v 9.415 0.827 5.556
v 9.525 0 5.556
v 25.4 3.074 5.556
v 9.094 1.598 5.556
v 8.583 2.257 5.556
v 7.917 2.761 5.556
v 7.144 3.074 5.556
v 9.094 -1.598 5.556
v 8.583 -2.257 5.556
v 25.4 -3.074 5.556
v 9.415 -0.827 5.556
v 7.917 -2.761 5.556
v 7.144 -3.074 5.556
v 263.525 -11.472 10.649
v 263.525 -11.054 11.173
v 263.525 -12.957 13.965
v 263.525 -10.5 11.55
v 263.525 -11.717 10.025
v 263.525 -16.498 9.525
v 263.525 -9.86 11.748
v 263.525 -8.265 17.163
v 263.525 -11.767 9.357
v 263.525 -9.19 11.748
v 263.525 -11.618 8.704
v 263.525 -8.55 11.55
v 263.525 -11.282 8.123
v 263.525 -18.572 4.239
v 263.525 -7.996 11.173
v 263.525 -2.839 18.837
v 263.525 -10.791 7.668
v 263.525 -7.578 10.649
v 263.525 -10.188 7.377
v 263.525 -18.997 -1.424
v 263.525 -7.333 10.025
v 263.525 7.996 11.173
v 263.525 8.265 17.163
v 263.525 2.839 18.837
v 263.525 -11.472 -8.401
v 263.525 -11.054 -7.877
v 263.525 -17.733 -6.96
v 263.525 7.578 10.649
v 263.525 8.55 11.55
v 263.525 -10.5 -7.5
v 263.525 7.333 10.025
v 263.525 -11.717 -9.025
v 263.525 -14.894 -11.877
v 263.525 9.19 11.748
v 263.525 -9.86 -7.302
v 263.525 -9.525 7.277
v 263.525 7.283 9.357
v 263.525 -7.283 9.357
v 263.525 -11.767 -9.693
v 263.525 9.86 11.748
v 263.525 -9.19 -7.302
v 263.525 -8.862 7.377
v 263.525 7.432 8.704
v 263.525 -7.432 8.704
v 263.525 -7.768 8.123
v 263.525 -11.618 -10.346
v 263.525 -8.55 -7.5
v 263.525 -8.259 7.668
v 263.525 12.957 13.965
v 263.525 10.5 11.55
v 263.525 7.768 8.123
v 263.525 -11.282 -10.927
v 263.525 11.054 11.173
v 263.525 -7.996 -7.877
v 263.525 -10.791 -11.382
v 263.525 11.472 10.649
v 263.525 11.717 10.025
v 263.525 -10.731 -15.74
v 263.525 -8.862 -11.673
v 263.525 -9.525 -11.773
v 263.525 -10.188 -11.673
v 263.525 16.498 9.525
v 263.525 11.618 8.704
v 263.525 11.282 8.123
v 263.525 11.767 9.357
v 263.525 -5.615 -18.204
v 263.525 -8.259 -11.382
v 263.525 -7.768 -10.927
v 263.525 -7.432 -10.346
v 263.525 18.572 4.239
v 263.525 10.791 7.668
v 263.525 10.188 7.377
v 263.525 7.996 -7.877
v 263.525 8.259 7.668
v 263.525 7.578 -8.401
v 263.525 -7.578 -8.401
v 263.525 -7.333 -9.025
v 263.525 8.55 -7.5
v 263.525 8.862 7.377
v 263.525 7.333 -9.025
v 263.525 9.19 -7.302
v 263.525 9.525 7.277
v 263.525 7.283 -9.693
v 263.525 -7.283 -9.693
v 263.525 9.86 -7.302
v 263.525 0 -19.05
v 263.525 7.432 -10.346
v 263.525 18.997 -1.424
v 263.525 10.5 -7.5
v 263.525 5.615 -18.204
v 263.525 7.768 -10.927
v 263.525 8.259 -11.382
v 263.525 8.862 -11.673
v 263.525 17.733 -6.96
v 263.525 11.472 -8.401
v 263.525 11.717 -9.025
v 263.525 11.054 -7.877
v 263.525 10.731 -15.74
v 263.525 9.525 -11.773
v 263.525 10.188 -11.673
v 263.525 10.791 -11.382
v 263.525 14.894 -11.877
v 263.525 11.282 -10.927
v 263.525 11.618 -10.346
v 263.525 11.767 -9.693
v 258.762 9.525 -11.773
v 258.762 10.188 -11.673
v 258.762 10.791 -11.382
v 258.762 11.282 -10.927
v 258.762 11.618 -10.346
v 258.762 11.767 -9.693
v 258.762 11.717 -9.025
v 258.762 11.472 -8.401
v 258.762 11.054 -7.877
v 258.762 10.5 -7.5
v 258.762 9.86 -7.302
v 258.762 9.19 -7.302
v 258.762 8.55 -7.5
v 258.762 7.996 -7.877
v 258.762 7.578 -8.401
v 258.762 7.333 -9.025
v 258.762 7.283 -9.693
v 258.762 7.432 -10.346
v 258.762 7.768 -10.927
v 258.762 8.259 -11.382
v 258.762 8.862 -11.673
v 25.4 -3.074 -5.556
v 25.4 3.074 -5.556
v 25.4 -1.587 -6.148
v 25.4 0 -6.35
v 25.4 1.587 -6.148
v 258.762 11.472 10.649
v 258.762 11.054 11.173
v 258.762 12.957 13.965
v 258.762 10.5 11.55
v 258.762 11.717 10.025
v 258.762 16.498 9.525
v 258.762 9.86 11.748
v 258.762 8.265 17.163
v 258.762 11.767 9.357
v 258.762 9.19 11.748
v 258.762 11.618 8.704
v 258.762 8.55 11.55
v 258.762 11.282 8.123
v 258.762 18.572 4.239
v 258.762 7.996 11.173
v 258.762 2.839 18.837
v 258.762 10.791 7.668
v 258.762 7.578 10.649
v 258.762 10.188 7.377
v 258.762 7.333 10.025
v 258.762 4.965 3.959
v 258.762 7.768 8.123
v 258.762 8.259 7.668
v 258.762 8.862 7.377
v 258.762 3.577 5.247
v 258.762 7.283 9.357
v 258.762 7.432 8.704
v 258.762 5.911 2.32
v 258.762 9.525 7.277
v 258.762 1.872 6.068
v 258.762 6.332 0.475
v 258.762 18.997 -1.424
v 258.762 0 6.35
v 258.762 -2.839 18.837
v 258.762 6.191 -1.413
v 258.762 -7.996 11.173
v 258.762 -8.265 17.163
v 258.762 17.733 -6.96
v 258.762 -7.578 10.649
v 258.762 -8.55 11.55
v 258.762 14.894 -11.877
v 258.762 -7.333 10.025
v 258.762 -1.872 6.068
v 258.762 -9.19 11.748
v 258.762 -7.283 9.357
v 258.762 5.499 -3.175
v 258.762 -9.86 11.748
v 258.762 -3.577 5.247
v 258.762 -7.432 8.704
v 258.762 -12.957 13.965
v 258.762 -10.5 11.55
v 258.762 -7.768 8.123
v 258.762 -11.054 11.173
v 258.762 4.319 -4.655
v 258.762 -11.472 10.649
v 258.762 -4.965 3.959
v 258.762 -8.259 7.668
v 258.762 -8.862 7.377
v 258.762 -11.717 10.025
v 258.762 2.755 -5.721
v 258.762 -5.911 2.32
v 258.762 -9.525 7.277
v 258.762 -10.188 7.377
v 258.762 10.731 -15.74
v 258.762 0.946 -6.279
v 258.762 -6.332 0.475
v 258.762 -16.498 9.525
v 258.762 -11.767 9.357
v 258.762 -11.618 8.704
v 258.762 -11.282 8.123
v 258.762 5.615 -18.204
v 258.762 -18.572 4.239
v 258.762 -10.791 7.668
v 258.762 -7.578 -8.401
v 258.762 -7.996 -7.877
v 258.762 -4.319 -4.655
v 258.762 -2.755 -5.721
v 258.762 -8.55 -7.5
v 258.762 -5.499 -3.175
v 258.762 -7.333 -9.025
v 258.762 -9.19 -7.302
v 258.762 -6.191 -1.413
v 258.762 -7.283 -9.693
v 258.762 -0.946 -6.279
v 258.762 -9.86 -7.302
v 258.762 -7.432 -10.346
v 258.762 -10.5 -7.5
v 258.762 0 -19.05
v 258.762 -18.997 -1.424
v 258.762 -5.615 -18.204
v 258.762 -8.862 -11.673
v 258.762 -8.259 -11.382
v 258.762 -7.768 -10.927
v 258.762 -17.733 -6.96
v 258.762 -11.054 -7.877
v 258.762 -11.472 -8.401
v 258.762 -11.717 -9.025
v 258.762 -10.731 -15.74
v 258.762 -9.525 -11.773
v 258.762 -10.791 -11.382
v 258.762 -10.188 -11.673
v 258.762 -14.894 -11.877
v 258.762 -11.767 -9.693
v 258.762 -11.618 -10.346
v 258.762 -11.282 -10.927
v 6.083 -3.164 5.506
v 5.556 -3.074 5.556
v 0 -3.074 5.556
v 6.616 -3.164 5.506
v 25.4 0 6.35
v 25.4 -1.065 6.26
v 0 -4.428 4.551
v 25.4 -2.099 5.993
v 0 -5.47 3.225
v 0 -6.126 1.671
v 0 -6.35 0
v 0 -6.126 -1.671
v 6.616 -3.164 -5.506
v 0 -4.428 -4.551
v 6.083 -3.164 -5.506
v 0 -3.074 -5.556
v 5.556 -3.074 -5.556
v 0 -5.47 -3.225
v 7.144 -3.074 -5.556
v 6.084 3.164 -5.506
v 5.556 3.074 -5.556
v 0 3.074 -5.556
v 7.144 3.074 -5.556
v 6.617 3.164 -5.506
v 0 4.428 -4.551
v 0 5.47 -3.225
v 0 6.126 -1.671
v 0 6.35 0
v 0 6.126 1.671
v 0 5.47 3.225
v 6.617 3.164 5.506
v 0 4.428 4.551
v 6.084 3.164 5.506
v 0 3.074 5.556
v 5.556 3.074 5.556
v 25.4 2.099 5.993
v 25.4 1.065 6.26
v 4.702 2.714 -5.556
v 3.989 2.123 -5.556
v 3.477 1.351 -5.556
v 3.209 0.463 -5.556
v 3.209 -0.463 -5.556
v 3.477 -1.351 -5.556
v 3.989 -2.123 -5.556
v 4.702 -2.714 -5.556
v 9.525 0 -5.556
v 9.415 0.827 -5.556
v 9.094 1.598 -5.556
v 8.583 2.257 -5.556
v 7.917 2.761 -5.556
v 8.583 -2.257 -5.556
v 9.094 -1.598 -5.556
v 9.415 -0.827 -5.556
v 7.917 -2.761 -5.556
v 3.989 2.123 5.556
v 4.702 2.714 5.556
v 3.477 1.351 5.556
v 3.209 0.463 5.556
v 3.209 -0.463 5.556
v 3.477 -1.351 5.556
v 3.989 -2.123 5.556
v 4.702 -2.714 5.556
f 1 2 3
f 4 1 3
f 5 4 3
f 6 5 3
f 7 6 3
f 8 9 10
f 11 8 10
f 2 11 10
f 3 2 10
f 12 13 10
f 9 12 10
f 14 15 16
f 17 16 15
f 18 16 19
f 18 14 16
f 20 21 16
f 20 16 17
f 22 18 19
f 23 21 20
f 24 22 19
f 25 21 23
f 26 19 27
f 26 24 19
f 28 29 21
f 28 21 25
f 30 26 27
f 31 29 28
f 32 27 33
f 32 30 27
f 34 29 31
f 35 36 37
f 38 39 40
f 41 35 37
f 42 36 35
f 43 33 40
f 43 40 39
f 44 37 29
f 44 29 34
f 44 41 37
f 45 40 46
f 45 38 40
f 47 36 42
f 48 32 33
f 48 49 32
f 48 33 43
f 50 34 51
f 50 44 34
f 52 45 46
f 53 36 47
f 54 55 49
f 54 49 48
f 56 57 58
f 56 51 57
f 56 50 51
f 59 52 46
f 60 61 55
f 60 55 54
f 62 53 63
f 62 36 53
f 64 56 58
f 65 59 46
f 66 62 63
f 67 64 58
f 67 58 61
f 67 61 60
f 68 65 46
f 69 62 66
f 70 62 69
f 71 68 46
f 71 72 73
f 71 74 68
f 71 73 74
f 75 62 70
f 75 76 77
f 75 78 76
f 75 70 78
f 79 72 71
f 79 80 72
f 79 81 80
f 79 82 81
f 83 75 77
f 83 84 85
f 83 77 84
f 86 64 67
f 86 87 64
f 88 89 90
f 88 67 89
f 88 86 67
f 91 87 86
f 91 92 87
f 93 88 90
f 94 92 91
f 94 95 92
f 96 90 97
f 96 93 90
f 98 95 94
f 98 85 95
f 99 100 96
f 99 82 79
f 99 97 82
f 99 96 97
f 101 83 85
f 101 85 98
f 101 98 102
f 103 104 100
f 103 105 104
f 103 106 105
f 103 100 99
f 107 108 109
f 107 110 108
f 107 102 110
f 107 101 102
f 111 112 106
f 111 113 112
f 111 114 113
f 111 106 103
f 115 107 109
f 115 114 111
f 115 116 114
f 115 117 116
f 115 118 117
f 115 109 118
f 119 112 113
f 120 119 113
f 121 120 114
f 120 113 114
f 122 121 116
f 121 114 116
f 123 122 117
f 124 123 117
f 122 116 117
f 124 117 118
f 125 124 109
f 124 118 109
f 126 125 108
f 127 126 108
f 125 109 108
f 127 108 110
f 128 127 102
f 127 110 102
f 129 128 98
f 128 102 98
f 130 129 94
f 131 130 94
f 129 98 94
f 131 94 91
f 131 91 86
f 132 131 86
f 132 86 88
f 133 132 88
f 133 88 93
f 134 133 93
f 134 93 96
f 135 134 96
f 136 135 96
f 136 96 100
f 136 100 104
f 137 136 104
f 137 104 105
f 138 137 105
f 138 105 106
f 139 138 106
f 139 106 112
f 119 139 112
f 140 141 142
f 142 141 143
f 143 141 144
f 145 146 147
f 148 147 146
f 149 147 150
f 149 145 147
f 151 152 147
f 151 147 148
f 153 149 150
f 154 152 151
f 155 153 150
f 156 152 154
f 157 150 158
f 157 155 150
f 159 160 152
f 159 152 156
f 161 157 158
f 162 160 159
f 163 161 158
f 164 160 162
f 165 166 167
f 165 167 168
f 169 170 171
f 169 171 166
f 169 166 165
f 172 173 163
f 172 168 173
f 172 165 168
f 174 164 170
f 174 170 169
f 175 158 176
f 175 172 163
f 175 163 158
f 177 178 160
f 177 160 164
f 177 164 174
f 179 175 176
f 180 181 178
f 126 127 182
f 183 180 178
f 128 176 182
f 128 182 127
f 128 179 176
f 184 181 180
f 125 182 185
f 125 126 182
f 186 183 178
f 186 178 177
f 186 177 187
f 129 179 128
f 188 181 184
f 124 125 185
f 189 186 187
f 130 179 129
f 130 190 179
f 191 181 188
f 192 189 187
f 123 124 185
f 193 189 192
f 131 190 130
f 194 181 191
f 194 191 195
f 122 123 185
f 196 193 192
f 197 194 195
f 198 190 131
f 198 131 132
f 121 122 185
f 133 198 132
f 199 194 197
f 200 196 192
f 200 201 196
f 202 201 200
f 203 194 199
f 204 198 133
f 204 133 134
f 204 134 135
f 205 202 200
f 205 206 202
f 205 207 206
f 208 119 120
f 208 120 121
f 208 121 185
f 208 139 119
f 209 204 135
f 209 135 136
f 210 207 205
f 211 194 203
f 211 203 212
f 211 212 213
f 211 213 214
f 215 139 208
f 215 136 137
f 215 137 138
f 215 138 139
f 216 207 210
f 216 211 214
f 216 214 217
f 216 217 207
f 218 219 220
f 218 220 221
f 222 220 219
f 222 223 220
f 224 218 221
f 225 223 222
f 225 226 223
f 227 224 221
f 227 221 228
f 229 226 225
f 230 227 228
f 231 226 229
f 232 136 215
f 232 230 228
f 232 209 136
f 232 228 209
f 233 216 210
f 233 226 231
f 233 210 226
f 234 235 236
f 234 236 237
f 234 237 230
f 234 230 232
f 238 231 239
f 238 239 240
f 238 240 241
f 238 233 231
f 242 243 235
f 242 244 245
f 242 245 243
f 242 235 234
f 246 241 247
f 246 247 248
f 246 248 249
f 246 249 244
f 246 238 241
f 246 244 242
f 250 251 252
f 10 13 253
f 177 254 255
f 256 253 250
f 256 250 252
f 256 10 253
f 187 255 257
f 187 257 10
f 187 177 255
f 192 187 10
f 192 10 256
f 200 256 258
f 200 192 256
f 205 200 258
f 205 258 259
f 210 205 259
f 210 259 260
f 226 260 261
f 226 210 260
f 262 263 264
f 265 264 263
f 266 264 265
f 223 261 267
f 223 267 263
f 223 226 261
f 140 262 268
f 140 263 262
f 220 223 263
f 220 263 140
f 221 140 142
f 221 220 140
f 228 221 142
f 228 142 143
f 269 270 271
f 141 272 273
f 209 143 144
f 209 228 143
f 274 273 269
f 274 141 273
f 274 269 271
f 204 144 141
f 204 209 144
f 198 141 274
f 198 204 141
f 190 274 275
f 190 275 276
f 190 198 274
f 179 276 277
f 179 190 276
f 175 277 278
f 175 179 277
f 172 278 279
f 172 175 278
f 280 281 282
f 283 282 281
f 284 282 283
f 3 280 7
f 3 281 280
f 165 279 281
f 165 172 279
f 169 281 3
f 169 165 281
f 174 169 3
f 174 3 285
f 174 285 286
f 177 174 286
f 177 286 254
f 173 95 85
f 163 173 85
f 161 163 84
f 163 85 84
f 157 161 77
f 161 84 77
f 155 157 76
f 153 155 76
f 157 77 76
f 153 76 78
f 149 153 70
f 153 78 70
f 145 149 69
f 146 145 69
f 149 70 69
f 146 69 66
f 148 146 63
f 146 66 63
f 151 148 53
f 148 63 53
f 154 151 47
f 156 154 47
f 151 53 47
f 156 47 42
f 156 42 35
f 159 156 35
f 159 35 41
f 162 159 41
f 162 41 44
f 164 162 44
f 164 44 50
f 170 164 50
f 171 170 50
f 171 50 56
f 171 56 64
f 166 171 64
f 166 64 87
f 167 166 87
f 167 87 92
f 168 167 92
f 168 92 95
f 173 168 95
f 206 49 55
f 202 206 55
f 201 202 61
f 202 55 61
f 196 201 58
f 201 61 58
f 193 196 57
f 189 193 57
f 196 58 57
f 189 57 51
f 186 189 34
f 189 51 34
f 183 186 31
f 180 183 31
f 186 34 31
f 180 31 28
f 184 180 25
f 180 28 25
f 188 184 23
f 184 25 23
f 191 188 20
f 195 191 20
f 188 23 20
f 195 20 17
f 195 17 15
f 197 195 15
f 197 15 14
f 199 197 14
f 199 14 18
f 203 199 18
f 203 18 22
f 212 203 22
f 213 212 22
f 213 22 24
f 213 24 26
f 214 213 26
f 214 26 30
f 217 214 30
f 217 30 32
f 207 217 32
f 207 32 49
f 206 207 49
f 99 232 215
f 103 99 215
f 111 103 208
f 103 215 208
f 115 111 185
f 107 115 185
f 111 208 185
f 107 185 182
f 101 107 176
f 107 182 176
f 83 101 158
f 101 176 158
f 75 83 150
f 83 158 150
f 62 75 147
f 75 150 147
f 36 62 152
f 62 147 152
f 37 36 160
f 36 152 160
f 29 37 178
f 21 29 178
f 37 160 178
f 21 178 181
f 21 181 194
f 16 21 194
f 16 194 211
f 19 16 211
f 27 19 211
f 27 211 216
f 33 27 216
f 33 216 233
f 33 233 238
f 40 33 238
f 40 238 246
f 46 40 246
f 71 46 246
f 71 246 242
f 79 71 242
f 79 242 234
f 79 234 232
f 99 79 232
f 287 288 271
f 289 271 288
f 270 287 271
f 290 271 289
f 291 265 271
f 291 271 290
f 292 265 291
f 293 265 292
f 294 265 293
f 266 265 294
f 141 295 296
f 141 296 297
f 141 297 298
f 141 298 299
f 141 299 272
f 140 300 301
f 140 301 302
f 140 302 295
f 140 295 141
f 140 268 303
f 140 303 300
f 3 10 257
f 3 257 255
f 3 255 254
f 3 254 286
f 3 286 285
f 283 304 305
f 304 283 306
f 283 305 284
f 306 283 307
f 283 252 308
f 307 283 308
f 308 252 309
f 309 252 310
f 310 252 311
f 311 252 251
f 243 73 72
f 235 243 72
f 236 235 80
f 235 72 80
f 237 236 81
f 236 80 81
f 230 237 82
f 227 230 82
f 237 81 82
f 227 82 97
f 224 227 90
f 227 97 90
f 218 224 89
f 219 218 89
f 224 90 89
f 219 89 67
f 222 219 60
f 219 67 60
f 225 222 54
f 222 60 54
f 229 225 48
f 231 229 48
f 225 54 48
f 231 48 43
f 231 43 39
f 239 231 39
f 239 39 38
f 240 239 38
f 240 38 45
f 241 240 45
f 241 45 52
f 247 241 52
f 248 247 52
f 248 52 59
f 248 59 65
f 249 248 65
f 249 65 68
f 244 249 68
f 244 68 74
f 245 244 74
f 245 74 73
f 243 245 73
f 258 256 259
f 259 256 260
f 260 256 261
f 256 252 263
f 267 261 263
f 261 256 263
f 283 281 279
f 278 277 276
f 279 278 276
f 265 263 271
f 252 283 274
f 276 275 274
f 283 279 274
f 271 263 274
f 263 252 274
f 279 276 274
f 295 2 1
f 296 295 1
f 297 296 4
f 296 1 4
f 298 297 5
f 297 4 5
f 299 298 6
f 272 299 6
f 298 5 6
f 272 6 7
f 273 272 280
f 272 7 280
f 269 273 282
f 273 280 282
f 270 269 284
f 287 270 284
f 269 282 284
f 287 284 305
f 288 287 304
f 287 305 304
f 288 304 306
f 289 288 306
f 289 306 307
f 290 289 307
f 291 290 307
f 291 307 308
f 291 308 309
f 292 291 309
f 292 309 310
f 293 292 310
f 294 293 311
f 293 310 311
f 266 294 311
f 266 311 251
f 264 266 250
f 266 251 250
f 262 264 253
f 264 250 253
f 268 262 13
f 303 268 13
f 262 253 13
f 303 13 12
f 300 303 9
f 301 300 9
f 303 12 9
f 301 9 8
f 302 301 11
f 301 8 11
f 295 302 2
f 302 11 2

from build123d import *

# Parameters (mm, degrees)
SKETCH1_R                       = 19.05
BOSS_EXTRUDE1_DEPTH             = 263.525
SKETCH2_W                       = 258.7625
SKETCH2_H                       = 12.7
CUT_EXTRUDE1_DEPTH              = 265.898528922
CUT_EXTRUDE1_DEPTH_BACK         = 265.898528922
SKETCH8_W                       = 25.4
SKETCH8_H                       = 0.79375
F_1_1_DIAMETER_HOLE2_D          = 6.35
F_16_0_177_DIAMETER_HOLE1_D     = 4.4958
F_16_0_177_DIAMETER_HOLE1_DEPTH = 25.4
F_16_0_177_DIAMETER_HOLE1_TIP   = 1.350674586


with BuildPart() as part:
    # Sketch1 → Boss-Extrude1 (new body)
    with BuildSketch(Plane(origin=(0, 0, 0), x_dir=(0, 0, -1), z_dir=(1, 0, 0))):
        Circle(SKETCH1_R)
    extrude(amount=BOSS_EXTRUDE1_DEPTH)

    # Sketch2 → Cut-Revolve1 (revolve, cut)
    with BuildSketch(Plane.XY, mode=Mode.PRIVATE) as cut_revolve1_sk:
        with Locations((129.38125, 12.7)):
            Rectangle(SKETCH2_W, SKETCH2_H)
    revolve(cut_revolve1_sk.sketch.rotate(Axis((-16.52066387, 0, 0), (1, 0, 0)), 90), axis=Axis((-16.52066387, 0, 0), (1, 0, 0)), mode=Mode.SUBTRACT)

    # Sketch8 → Cut-Extrude1 (cut, two sides: drawn at the far end of the back side and taken through both)
    with BuildSketch(Plane(origin=(0, 0, 0), x_dir=(1, 0, 0), z_dir=(0, 1, 0)).offset(-CUT_EXTRUDE1_DEPTH_BACK)):
        with Locations((12.7, 5.953125)):
            Rectangle(SKETCH8_W, SKETCH8_H)
        with Locations((12.7, -5.953125)):
            Rectangle(SKETCH8_W, SKETCH8_H)
    extrude(amount=CUT_EXTRUDE1_DEPTH + CUT_EXTRUDE1_DEPTH_BACK, mode=Mode.SUBTRACT)

    # 1 (1) Diameter Hole2 (through all)
    with Locations(Plane(origin=(0, 0, -5.55625), x_dir=(-1, 0, 0), z_dir=(0, 0, -1))):
        with Locations((-6.35, 0)):
            Hole(F_1_1_DIAMETER_HOLE2_D / 2)

    # #16 (0.177) Diameter Hole1
    with Locations(Plane.ZY.offset(-258.7625)):
        with Locations((9.525, 9.525), (-9.525, -9.525), (-9.525, 9.525), (9.525, -9.525)):
            Hole(F_16_0_177_DIAMETER_HOLE1_D / 2, depth=F_16_0_177_DIAMETER_HOLE1_DEPTH)
            with Locations((0, 0, -(F_16_0_177_DIAMETER_HOLE1_DEPTH + F_16_0_177_DIAMETER_HOLE1_TIP / 2))):  # 118° drill point
                Cone(0, F_16_0_177_DIAMETER_HOLE1_D / 2, F_16_0_177_DIAMETER_HOLE1_TIP, mode=Mode.SUBTRACT)


solid = part.part
